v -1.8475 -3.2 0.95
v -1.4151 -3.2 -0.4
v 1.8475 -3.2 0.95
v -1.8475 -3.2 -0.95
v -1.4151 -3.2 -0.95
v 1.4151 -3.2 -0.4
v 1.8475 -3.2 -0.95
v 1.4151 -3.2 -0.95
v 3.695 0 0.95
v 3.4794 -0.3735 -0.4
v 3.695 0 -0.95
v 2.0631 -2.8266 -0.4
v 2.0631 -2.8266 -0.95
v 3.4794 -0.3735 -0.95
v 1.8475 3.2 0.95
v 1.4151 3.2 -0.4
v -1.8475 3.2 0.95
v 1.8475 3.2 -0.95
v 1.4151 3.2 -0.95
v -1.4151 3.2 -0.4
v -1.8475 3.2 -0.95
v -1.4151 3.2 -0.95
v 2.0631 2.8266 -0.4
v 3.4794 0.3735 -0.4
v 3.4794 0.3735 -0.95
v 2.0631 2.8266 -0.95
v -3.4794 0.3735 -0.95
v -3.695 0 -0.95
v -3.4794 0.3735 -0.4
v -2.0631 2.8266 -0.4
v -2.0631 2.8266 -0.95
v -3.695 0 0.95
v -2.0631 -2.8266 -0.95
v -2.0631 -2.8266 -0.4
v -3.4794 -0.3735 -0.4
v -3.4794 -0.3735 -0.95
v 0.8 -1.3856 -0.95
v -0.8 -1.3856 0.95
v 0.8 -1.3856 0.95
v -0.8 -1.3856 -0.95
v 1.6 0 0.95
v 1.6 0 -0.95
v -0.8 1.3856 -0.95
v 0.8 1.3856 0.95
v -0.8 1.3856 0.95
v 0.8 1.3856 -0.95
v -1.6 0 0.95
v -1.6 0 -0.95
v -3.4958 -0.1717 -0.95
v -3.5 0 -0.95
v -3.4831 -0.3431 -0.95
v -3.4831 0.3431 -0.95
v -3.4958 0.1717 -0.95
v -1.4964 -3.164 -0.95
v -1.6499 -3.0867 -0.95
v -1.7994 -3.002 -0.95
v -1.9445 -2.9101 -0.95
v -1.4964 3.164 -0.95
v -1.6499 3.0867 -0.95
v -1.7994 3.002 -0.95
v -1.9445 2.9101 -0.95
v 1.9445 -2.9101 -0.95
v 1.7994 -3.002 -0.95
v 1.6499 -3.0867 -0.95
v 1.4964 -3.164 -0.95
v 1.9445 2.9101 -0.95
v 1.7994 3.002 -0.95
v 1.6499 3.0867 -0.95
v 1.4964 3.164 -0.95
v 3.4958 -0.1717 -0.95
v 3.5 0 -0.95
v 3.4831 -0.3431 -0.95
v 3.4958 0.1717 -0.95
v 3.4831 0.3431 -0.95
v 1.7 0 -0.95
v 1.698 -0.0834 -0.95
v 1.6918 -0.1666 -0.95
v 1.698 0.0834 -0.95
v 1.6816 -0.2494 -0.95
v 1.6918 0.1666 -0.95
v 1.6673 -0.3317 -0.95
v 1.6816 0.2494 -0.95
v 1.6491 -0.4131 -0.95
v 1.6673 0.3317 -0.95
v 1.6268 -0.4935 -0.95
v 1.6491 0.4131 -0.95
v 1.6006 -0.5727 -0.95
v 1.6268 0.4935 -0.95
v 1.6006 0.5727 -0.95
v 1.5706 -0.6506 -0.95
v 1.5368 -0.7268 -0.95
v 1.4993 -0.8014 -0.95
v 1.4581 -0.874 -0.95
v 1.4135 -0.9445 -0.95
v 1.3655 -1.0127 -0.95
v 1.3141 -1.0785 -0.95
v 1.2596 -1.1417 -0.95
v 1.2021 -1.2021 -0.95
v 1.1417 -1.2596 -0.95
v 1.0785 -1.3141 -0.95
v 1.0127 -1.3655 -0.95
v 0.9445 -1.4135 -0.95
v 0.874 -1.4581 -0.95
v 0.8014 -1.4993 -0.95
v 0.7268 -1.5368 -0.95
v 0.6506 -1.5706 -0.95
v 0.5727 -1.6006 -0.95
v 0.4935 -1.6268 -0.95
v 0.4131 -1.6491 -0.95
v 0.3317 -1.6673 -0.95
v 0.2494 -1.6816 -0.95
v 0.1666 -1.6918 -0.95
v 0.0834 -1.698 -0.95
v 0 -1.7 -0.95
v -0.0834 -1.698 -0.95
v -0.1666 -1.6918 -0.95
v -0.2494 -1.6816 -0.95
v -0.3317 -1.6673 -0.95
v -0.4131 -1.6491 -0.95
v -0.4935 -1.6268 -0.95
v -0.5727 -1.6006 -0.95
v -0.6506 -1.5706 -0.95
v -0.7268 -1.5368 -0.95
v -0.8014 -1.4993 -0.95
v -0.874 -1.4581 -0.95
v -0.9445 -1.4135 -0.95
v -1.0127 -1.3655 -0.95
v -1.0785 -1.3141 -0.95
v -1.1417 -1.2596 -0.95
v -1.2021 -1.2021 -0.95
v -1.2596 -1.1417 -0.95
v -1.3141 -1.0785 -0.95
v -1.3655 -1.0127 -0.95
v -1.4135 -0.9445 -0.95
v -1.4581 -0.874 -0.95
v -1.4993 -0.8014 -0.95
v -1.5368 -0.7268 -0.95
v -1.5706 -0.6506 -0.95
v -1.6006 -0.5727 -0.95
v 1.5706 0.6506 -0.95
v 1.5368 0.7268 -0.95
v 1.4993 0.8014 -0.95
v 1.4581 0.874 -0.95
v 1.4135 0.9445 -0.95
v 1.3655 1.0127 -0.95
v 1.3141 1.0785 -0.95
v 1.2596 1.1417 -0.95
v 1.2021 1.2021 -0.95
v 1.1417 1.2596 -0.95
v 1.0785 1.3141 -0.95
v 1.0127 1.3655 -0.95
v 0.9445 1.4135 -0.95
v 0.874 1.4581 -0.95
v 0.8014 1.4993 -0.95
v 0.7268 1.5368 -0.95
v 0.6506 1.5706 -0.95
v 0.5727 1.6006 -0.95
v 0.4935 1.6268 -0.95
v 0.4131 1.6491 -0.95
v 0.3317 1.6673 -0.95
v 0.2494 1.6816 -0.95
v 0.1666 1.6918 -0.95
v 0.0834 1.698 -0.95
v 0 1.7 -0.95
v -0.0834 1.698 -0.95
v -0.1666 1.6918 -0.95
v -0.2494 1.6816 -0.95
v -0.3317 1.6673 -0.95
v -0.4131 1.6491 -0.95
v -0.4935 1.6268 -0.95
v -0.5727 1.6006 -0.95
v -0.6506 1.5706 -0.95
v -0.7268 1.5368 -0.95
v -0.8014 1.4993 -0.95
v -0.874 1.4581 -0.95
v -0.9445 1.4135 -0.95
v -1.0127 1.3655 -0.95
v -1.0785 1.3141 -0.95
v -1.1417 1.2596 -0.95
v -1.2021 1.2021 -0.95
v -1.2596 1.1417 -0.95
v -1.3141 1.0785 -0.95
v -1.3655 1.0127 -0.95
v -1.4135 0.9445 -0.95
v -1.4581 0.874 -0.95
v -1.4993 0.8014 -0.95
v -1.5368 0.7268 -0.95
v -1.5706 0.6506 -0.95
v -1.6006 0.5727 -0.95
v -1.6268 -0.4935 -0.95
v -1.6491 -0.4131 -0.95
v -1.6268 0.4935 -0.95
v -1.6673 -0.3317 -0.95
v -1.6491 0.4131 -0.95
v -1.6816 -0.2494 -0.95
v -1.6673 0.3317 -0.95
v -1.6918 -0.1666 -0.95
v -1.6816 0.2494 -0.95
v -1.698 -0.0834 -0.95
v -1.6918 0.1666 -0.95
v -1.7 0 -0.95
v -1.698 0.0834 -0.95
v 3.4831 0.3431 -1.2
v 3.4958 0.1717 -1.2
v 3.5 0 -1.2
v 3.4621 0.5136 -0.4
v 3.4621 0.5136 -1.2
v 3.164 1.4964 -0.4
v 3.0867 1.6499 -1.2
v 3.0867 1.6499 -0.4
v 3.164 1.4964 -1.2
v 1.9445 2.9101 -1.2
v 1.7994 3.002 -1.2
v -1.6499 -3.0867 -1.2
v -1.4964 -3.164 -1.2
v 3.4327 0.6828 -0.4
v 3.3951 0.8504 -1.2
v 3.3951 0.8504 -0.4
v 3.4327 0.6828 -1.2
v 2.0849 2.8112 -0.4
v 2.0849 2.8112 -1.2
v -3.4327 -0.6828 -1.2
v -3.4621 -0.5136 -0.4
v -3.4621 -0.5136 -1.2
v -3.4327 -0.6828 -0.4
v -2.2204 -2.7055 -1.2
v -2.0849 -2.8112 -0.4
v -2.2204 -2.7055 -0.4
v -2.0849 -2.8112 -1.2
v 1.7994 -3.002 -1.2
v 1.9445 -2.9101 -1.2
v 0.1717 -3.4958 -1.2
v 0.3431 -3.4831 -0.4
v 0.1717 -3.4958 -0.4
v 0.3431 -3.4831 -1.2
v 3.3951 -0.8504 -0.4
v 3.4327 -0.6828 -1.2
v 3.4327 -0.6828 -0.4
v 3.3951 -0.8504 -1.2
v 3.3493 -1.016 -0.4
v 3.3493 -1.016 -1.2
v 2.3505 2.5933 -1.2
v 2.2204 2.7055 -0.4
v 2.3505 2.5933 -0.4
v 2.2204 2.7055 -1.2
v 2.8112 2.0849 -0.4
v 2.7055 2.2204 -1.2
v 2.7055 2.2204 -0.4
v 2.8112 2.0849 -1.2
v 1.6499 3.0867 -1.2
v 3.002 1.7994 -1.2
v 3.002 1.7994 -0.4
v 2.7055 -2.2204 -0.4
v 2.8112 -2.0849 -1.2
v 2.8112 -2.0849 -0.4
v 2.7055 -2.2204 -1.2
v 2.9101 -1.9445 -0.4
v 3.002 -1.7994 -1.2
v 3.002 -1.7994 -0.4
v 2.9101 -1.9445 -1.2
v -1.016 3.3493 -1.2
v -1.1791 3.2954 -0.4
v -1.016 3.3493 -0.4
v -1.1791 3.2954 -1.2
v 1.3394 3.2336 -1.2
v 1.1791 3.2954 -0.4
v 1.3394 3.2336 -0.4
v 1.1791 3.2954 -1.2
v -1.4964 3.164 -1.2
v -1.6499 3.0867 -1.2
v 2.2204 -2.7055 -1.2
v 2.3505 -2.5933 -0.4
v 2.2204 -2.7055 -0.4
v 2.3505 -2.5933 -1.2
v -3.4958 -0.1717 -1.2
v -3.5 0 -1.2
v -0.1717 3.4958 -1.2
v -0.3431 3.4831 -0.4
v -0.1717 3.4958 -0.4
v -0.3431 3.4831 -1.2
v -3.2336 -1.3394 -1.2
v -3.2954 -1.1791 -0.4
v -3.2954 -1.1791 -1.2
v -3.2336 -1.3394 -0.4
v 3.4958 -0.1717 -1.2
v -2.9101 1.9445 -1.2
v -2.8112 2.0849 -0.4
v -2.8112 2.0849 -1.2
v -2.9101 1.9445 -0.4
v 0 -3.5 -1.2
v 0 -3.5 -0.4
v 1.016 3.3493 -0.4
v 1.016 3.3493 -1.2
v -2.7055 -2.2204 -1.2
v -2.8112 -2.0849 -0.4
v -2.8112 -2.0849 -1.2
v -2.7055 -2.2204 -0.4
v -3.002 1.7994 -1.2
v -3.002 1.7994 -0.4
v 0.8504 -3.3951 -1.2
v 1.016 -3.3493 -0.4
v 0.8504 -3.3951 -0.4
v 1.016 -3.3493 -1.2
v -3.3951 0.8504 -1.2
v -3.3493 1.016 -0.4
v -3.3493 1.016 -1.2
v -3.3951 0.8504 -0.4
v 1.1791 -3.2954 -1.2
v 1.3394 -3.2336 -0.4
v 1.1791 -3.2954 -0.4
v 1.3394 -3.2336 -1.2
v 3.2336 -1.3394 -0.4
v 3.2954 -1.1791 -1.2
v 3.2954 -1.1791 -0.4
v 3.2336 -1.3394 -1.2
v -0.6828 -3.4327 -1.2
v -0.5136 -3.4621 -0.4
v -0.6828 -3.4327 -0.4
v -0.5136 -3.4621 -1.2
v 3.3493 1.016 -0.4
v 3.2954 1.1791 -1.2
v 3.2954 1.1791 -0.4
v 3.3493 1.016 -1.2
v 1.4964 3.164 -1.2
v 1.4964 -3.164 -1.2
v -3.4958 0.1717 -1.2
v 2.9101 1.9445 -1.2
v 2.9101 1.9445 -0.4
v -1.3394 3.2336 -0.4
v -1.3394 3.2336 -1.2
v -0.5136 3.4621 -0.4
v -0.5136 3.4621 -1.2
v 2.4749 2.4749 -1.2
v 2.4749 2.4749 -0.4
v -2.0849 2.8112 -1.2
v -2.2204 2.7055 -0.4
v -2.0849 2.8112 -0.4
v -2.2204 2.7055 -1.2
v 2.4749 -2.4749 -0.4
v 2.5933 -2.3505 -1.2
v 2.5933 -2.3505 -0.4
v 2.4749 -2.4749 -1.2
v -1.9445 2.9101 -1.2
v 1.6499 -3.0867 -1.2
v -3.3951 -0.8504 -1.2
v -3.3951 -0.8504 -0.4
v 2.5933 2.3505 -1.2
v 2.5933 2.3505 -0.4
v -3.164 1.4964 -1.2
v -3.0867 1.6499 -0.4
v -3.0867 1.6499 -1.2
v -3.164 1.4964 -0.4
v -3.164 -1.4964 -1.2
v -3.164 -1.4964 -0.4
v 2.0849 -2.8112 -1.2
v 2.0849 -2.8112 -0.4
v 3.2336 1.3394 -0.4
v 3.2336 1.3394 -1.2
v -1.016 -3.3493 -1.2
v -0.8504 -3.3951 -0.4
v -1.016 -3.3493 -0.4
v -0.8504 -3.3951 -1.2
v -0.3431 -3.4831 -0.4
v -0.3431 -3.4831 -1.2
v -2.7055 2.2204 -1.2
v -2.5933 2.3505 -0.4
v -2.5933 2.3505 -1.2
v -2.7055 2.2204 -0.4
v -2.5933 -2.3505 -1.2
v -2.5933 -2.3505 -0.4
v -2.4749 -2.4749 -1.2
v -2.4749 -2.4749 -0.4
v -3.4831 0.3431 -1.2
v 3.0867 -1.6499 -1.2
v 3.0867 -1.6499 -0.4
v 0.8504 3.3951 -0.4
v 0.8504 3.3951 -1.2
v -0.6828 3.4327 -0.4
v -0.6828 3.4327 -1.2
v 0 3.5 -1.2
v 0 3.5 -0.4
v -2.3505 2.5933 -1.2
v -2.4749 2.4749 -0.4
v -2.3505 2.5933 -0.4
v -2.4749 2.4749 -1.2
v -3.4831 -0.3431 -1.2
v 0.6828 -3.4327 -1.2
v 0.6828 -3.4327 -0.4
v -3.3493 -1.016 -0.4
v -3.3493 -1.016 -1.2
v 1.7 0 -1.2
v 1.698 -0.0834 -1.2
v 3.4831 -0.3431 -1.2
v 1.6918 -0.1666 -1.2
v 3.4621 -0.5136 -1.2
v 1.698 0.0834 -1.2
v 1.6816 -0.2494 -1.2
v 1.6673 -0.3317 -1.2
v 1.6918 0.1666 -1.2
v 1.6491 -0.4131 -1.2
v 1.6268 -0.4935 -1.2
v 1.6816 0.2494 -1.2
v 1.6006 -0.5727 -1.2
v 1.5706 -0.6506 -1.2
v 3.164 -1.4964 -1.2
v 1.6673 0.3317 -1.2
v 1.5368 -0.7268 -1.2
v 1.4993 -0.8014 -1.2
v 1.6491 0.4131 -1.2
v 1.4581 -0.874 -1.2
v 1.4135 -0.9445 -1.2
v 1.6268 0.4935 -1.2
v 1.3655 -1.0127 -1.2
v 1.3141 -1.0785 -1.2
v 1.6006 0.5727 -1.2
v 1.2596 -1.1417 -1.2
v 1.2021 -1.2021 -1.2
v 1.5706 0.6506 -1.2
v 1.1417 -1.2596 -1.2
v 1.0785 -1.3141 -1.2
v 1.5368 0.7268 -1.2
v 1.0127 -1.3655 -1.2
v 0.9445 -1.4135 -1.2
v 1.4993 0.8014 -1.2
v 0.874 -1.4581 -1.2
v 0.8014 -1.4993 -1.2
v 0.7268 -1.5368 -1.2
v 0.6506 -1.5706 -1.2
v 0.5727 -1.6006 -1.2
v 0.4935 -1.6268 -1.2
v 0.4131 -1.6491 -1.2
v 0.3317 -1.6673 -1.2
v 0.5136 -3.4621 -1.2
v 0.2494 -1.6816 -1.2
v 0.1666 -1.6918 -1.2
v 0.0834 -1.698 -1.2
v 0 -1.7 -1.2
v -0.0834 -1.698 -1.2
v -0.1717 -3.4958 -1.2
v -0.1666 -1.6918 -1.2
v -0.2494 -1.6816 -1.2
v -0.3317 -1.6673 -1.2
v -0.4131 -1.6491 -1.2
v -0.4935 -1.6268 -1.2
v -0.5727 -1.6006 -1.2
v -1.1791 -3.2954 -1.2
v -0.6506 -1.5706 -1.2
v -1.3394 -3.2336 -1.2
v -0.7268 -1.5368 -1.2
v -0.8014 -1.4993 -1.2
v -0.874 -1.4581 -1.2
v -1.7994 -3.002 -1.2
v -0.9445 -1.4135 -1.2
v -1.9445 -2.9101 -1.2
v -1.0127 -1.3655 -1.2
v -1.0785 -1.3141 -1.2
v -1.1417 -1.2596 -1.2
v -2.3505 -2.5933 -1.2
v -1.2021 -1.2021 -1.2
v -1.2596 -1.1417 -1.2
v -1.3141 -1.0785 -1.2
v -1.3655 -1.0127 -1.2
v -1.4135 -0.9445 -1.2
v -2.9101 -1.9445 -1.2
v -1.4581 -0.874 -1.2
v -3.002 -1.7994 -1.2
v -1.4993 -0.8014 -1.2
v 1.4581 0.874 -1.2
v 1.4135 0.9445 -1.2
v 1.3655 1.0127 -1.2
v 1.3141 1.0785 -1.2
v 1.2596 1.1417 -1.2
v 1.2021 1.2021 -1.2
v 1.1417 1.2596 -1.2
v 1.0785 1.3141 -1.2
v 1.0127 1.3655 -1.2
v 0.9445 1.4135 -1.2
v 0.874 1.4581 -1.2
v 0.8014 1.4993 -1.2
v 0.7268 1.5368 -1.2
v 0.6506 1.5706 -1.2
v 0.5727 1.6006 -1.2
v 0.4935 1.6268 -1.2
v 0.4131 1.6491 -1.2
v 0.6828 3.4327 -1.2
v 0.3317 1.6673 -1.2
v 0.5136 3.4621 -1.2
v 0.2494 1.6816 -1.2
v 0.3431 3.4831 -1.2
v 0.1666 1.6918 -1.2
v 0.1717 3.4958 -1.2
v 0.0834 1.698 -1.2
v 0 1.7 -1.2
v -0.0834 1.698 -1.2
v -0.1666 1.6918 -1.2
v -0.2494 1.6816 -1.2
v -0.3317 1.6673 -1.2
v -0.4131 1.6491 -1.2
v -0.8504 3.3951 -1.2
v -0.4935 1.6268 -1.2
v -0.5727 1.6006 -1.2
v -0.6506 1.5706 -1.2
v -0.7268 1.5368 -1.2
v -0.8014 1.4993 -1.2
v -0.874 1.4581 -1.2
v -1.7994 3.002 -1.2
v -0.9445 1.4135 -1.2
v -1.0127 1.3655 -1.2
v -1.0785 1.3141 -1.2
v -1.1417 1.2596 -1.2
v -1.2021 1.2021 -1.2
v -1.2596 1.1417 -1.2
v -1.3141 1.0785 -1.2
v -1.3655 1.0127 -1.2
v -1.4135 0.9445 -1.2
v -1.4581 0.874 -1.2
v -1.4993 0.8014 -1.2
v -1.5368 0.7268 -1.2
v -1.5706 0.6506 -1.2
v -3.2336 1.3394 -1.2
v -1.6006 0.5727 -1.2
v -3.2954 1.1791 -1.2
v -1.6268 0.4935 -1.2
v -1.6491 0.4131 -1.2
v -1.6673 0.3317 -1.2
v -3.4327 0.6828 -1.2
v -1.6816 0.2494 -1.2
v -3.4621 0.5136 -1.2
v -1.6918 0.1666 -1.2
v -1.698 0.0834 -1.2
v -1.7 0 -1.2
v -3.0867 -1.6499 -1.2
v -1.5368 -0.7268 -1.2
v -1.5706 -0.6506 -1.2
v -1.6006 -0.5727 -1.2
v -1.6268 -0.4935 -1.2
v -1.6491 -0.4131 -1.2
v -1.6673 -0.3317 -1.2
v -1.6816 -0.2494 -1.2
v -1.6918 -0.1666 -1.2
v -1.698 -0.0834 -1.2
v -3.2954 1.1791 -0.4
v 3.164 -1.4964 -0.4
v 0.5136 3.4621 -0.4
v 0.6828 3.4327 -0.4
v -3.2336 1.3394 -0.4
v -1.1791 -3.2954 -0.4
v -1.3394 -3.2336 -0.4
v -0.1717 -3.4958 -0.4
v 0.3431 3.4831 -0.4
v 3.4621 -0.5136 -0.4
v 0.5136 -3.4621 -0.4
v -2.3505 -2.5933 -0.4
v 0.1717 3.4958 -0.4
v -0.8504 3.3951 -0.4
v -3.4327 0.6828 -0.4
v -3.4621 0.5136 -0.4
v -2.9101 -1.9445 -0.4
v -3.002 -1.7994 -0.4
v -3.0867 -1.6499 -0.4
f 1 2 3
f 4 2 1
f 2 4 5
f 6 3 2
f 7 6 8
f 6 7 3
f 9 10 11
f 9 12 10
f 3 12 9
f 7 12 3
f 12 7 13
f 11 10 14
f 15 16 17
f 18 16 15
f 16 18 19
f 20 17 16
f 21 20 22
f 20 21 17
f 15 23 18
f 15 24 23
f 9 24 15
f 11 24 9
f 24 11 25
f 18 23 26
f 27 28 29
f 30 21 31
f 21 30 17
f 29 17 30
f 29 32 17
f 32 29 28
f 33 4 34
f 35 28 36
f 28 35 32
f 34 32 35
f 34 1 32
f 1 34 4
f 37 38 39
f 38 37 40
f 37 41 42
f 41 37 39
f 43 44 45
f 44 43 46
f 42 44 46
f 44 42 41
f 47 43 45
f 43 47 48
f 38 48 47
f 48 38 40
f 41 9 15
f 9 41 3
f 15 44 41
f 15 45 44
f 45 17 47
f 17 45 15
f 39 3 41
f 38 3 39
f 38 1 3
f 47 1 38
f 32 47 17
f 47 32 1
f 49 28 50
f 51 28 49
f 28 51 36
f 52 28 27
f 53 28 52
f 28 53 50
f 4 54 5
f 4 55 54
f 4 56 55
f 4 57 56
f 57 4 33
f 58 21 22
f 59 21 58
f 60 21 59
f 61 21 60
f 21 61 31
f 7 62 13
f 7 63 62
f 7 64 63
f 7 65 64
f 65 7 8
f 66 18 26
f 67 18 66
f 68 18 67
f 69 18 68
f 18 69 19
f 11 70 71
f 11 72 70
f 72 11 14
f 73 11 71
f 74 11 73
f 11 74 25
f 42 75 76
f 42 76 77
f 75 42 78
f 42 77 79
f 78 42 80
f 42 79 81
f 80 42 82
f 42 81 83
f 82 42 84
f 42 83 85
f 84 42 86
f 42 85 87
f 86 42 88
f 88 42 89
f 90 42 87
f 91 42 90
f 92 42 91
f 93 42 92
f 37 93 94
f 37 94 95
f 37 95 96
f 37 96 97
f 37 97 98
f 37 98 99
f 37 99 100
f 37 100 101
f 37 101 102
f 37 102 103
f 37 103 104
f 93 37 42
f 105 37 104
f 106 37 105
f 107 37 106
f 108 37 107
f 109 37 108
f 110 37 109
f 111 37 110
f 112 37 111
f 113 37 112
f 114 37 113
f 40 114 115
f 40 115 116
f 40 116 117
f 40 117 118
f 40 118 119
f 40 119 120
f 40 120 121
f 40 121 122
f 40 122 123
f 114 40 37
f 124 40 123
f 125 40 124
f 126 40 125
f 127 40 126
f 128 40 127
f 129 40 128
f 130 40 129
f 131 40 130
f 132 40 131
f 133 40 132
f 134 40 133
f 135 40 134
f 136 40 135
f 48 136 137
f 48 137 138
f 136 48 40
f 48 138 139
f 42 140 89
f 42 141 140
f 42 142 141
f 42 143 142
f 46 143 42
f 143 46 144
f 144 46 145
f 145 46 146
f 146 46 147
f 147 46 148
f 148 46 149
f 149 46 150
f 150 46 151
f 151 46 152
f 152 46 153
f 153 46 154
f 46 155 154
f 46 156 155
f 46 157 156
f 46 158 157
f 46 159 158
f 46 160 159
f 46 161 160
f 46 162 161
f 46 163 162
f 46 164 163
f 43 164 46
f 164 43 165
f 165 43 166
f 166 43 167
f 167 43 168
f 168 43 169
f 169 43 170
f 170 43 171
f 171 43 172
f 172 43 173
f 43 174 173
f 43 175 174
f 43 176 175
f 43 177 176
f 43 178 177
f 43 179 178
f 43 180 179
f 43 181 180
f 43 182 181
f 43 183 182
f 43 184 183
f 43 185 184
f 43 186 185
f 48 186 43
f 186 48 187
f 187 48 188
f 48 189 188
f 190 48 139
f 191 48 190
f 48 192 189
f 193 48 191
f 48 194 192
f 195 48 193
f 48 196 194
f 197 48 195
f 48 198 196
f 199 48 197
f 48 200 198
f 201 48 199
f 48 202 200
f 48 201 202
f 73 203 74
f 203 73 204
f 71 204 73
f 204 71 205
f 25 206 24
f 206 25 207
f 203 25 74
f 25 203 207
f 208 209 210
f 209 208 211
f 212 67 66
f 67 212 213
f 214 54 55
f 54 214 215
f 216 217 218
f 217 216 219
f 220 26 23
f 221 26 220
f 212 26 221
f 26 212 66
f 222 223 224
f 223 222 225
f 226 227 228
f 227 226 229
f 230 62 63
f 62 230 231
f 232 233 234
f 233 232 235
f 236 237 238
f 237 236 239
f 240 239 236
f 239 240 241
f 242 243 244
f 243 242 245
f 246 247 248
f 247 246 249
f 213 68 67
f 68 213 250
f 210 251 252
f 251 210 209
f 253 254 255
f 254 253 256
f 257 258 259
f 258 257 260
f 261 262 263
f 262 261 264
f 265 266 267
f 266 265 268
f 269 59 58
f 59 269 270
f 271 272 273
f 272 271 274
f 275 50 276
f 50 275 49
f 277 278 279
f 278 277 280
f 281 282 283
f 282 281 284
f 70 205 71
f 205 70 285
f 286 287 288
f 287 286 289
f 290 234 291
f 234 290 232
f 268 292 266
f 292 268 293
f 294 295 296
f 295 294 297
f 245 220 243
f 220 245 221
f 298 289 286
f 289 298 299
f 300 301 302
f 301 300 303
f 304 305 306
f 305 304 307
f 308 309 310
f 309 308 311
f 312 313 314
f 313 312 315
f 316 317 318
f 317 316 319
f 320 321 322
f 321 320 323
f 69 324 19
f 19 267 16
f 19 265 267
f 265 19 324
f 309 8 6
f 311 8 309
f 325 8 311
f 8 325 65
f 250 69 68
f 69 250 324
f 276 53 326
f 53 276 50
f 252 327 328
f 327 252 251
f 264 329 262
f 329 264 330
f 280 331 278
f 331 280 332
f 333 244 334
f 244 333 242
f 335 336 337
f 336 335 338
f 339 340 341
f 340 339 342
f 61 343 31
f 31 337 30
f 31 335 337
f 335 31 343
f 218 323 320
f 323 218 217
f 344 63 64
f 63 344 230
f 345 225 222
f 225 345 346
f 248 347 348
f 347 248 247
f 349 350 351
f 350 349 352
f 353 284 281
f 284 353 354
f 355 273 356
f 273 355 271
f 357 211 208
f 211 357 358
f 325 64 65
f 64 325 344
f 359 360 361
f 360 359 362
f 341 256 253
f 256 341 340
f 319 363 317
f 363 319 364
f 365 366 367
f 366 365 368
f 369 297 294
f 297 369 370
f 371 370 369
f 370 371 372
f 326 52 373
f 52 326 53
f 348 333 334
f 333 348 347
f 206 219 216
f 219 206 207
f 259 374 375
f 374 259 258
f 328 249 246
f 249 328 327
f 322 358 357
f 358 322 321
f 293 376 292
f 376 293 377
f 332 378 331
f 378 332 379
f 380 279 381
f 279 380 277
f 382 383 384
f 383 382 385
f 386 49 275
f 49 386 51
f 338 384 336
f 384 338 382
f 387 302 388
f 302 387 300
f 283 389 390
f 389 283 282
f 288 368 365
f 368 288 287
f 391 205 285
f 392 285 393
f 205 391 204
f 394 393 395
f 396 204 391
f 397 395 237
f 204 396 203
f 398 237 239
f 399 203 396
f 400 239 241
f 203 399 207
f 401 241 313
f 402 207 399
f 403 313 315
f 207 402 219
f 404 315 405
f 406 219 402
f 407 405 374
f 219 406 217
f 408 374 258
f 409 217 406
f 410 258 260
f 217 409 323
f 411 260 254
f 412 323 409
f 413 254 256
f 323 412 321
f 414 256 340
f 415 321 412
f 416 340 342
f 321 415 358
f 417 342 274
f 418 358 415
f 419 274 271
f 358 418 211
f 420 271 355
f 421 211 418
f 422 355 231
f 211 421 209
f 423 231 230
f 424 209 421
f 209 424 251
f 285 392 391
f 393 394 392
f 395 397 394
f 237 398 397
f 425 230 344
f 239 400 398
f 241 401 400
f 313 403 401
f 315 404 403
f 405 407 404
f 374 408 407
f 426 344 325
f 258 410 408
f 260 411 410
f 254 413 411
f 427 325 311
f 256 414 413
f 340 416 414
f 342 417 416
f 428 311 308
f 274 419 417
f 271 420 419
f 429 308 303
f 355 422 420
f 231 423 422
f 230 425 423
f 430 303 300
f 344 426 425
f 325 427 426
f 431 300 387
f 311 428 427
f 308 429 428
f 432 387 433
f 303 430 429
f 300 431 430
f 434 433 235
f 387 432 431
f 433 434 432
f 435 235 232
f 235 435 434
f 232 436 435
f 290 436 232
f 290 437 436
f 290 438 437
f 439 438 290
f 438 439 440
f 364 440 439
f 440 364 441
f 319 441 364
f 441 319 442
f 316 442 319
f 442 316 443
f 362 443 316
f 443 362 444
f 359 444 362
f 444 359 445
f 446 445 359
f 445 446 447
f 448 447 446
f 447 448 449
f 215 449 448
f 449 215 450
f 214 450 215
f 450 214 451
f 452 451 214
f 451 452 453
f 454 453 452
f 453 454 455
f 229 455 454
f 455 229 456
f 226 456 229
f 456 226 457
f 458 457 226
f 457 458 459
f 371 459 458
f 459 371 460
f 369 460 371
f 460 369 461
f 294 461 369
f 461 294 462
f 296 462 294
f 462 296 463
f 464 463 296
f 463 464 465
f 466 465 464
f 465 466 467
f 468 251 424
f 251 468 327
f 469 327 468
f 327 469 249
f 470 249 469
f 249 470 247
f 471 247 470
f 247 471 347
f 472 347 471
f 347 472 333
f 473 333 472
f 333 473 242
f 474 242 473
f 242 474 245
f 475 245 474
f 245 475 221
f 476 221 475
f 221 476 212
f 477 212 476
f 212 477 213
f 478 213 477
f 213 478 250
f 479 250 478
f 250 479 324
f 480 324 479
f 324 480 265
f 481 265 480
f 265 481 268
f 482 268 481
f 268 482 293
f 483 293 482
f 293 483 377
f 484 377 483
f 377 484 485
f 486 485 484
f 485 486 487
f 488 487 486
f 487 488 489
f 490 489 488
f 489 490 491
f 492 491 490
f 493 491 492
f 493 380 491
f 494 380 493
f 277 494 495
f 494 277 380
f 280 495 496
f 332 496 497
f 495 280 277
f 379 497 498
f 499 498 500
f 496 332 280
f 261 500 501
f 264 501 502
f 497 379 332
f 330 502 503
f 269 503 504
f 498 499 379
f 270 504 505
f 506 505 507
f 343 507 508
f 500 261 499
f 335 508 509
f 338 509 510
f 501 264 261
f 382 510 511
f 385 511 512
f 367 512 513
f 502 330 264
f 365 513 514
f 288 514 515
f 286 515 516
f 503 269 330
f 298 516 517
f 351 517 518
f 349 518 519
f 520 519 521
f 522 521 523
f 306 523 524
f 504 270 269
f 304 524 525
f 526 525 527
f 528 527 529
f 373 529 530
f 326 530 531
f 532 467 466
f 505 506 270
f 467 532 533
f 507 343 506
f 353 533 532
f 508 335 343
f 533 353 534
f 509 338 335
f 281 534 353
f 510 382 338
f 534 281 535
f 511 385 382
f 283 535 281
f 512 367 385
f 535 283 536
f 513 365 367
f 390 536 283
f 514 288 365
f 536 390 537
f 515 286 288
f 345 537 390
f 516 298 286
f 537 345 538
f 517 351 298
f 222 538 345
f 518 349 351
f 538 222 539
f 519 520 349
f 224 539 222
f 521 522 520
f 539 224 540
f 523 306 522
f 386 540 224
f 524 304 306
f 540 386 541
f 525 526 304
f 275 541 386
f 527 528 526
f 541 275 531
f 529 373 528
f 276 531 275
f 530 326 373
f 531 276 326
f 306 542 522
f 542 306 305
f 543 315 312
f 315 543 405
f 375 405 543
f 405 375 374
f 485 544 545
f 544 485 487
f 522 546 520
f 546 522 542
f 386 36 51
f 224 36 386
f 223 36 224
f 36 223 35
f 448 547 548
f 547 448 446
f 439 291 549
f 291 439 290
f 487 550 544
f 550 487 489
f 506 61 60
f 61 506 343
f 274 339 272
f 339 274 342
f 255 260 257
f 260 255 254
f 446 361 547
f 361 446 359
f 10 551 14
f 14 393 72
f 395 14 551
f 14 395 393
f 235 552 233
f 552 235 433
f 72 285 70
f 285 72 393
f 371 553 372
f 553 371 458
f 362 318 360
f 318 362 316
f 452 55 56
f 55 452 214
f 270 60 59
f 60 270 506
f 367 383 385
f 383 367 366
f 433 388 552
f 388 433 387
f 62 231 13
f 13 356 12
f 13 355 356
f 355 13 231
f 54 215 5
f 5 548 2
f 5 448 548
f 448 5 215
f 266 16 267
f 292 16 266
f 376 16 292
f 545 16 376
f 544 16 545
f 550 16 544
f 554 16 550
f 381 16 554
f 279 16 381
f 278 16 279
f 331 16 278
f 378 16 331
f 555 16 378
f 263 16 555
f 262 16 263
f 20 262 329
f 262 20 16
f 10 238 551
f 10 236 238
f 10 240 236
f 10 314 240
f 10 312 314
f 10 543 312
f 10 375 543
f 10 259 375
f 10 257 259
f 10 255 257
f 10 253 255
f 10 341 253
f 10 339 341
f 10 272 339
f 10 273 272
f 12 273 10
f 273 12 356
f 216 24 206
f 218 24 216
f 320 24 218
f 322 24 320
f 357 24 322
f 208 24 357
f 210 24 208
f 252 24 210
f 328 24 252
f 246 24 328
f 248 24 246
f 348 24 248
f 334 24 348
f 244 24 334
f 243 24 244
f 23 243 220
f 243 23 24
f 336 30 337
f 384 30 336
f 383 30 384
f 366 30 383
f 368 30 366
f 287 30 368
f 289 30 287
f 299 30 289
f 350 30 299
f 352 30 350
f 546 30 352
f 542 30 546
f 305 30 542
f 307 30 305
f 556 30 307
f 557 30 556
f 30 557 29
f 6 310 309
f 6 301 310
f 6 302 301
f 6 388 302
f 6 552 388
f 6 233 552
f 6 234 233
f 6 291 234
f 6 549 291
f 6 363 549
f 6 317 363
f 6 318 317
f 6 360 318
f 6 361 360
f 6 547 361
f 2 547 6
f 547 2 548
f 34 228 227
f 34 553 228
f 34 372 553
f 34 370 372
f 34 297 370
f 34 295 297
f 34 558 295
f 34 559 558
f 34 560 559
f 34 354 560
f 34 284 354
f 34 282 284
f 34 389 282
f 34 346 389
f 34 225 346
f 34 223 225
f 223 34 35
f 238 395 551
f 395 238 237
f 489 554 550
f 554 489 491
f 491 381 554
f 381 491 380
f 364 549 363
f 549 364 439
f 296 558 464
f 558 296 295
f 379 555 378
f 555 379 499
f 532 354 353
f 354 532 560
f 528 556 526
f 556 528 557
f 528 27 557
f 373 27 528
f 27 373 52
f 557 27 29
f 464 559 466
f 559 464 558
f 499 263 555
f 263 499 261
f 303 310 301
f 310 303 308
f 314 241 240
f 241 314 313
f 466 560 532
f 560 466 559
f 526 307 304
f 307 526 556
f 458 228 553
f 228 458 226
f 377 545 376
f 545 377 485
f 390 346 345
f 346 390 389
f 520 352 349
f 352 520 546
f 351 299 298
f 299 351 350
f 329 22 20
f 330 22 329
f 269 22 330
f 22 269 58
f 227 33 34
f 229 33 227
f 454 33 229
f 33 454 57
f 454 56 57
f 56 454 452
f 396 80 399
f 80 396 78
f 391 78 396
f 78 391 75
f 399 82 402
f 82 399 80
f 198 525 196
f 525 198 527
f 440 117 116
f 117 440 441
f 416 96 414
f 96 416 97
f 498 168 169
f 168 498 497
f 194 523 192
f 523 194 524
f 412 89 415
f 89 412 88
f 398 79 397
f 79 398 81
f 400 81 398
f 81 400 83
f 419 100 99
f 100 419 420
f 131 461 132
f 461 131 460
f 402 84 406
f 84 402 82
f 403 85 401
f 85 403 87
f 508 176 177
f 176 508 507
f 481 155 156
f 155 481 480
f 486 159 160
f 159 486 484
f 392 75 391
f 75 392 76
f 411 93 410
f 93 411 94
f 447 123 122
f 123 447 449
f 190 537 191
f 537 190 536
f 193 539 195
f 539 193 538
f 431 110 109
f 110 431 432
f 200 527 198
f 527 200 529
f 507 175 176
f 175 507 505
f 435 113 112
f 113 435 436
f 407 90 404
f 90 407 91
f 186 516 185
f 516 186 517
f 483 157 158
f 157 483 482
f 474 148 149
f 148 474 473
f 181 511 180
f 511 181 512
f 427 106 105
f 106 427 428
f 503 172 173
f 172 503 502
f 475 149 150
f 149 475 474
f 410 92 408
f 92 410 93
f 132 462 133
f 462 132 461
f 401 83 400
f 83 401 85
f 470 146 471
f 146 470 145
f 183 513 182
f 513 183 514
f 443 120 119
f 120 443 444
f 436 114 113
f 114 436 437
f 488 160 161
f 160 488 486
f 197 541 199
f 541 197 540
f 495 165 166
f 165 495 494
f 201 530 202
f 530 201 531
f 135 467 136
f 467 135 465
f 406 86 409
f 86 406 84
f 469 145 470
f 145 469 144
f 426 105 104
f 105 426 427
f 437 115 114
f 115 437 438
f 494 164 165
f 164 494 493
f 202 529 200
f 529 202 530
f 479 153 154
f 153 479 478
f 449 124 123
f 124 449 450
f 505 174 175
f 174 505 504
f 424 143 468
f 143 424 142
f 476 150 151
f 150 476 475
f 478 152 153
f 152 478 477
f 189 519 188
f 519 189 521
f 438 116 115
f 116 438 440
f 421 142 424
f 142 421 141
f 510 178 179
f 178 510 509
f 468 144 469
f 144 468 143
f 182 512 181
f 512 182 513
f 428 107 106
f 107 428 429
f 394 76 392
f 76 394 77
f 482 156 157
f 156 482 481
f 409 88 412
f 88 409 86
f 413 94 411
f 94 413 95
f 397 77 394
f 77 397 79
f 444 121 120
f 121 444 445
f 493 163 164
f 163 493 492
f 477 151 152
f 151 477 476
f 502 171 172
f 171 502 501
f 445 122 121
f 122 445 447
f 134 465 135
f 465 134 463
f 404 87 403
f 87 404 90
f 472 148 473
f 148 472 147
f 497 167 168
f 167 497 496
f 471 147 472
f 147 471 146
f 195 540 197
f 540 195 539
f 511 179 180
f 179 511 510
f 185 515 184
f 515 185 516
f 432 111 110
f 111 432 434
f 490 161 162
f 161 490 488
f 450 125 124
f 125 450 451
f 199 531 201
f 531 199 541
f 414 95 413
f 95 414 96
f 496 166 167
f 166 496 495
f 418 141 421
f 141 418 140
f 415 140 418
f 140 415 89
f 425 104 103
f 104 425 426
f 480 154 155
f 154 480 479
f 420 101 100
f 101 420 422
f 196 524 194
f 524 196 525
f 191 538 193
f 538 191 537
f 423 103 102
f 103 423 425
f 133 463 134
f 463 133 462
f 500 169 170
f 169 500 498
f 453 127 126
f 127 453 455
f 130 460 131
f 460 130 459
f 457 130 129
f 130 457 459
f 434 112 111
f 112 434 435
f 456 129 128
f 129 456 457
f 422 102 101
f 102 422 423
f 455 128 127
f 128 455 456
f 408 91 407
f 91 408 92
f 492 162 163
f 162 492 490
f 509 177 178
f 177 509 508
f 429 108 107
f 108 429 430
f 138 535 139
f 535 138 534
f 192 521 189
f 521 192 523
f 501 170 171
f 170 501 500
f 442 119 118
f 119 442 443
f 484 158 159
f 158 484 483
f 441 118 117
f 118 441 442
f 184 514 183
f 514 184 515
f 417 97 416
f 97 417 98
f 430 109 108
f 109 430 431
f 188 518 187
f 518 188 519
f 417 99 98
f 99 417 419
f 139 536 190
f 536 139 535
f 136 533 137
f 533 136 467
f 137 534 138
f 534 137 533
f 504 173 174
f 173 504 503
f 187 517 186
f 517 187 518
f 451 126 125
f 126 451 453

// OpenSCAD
// Parameters
thread_nominal_diameter = 3; //[1.5:6:0.1]
thread_pitch = 0.5; //[0.25:1:0.05]
across_flats = 6.4; //[3.2:12.8:0.1]
thickness = 2.4; //[1.2:4.8:0.1]
across_corners = 7.39; //[3.695:14.78:0.01]
hole_diameter_for_tap = 2.5; //[1.25:5:0.05]
hole_diameter_clearance = 3.2; //[1.6:6.4:0.05]
chamfer_size = 0.25; //[0.1:0.6:0.05]
eps = 0.6; //[0.2:1.2:0.1]
washer_outer_diameter = 7; //[3.5:14:0.1]
washer_thickness = 0.8; //[0.4:1.6:0.05]
washer_hole_diameter = 3.4; //[1.7:6.8:0.05]
nut_washer_overlap = 0.8; //[0.3:1.5:0.05]

// Connectivity overlap (1–2mm) to guarantee attachment
attach_overlap = 1.2;

// Derived
nut_r = across_flats/(2*cos(30));

// Hex Nut Module (fixed: chamfers are now SUBTRACTED from the nut, not added as floating fragments)
module hex_nut() {
  color("DimGray")
  difference() {
    // Main hex body
    cylinder(h=thickness, r=nut_r, center=true, $fn=6);

    // Central hole
    cylinder(h=thickness + 2*eps, r=hole_diameter_clearance/2, center=true);

    // Top chamfer (subtract a cone/frustum that intersects the top face)
    translate([0, 0, thickness/2 - chamfer_size/2 + attach_overlap/2])
      cylinder(
        h = chamfer_size + attach_overlap,
        r1 = nut_r + eps,
        r2 = nut_r - chamfer_size,
        center = true,
        $fn = 96
      );

    // Bottom chamfer (subtract a cone/frustum that intersects the bottom face)
    translate([0, 0, -thickness/2 + chamfer_size/2 - attach_overlap/2])
      cylinder(
        h = chamfer_size + attach_overlap,
        r1 = nut_r - chamfer_size,
        r2 = nut_r + eps,
        center = true,
        $fn = 96
      );
  }
}

// Washer Module (kept attached with explicit overlap into nut)
module washer() {
  color("Silver")
  difference() {
    // Place washer so it overlaps into the nut by nut_washer_overlap (and a bit extra for robustness)
    translate([0, 0, -(thickness/2 + washer_thickness/2 - nut_washer_overlap)])
      cylinder(h=washer_thickness, r=washer_outer_diameter/2, center=true, $fn=128);

    translate([0, 0, -(thickness/2 + washer_thickness/2 - nut_washer_overlap)])
      cylinder(h=washer_thickness + 2*eps, r=washer_hole_diameter/2, center=true, $fn=128);
  }
}

// Nut and Washer Assembly (single connected solid)
module nut_and_washer() {
  union() {
    hex_nut();
    washer();
  }
}

// Final Assembly
nut_and_washer();
